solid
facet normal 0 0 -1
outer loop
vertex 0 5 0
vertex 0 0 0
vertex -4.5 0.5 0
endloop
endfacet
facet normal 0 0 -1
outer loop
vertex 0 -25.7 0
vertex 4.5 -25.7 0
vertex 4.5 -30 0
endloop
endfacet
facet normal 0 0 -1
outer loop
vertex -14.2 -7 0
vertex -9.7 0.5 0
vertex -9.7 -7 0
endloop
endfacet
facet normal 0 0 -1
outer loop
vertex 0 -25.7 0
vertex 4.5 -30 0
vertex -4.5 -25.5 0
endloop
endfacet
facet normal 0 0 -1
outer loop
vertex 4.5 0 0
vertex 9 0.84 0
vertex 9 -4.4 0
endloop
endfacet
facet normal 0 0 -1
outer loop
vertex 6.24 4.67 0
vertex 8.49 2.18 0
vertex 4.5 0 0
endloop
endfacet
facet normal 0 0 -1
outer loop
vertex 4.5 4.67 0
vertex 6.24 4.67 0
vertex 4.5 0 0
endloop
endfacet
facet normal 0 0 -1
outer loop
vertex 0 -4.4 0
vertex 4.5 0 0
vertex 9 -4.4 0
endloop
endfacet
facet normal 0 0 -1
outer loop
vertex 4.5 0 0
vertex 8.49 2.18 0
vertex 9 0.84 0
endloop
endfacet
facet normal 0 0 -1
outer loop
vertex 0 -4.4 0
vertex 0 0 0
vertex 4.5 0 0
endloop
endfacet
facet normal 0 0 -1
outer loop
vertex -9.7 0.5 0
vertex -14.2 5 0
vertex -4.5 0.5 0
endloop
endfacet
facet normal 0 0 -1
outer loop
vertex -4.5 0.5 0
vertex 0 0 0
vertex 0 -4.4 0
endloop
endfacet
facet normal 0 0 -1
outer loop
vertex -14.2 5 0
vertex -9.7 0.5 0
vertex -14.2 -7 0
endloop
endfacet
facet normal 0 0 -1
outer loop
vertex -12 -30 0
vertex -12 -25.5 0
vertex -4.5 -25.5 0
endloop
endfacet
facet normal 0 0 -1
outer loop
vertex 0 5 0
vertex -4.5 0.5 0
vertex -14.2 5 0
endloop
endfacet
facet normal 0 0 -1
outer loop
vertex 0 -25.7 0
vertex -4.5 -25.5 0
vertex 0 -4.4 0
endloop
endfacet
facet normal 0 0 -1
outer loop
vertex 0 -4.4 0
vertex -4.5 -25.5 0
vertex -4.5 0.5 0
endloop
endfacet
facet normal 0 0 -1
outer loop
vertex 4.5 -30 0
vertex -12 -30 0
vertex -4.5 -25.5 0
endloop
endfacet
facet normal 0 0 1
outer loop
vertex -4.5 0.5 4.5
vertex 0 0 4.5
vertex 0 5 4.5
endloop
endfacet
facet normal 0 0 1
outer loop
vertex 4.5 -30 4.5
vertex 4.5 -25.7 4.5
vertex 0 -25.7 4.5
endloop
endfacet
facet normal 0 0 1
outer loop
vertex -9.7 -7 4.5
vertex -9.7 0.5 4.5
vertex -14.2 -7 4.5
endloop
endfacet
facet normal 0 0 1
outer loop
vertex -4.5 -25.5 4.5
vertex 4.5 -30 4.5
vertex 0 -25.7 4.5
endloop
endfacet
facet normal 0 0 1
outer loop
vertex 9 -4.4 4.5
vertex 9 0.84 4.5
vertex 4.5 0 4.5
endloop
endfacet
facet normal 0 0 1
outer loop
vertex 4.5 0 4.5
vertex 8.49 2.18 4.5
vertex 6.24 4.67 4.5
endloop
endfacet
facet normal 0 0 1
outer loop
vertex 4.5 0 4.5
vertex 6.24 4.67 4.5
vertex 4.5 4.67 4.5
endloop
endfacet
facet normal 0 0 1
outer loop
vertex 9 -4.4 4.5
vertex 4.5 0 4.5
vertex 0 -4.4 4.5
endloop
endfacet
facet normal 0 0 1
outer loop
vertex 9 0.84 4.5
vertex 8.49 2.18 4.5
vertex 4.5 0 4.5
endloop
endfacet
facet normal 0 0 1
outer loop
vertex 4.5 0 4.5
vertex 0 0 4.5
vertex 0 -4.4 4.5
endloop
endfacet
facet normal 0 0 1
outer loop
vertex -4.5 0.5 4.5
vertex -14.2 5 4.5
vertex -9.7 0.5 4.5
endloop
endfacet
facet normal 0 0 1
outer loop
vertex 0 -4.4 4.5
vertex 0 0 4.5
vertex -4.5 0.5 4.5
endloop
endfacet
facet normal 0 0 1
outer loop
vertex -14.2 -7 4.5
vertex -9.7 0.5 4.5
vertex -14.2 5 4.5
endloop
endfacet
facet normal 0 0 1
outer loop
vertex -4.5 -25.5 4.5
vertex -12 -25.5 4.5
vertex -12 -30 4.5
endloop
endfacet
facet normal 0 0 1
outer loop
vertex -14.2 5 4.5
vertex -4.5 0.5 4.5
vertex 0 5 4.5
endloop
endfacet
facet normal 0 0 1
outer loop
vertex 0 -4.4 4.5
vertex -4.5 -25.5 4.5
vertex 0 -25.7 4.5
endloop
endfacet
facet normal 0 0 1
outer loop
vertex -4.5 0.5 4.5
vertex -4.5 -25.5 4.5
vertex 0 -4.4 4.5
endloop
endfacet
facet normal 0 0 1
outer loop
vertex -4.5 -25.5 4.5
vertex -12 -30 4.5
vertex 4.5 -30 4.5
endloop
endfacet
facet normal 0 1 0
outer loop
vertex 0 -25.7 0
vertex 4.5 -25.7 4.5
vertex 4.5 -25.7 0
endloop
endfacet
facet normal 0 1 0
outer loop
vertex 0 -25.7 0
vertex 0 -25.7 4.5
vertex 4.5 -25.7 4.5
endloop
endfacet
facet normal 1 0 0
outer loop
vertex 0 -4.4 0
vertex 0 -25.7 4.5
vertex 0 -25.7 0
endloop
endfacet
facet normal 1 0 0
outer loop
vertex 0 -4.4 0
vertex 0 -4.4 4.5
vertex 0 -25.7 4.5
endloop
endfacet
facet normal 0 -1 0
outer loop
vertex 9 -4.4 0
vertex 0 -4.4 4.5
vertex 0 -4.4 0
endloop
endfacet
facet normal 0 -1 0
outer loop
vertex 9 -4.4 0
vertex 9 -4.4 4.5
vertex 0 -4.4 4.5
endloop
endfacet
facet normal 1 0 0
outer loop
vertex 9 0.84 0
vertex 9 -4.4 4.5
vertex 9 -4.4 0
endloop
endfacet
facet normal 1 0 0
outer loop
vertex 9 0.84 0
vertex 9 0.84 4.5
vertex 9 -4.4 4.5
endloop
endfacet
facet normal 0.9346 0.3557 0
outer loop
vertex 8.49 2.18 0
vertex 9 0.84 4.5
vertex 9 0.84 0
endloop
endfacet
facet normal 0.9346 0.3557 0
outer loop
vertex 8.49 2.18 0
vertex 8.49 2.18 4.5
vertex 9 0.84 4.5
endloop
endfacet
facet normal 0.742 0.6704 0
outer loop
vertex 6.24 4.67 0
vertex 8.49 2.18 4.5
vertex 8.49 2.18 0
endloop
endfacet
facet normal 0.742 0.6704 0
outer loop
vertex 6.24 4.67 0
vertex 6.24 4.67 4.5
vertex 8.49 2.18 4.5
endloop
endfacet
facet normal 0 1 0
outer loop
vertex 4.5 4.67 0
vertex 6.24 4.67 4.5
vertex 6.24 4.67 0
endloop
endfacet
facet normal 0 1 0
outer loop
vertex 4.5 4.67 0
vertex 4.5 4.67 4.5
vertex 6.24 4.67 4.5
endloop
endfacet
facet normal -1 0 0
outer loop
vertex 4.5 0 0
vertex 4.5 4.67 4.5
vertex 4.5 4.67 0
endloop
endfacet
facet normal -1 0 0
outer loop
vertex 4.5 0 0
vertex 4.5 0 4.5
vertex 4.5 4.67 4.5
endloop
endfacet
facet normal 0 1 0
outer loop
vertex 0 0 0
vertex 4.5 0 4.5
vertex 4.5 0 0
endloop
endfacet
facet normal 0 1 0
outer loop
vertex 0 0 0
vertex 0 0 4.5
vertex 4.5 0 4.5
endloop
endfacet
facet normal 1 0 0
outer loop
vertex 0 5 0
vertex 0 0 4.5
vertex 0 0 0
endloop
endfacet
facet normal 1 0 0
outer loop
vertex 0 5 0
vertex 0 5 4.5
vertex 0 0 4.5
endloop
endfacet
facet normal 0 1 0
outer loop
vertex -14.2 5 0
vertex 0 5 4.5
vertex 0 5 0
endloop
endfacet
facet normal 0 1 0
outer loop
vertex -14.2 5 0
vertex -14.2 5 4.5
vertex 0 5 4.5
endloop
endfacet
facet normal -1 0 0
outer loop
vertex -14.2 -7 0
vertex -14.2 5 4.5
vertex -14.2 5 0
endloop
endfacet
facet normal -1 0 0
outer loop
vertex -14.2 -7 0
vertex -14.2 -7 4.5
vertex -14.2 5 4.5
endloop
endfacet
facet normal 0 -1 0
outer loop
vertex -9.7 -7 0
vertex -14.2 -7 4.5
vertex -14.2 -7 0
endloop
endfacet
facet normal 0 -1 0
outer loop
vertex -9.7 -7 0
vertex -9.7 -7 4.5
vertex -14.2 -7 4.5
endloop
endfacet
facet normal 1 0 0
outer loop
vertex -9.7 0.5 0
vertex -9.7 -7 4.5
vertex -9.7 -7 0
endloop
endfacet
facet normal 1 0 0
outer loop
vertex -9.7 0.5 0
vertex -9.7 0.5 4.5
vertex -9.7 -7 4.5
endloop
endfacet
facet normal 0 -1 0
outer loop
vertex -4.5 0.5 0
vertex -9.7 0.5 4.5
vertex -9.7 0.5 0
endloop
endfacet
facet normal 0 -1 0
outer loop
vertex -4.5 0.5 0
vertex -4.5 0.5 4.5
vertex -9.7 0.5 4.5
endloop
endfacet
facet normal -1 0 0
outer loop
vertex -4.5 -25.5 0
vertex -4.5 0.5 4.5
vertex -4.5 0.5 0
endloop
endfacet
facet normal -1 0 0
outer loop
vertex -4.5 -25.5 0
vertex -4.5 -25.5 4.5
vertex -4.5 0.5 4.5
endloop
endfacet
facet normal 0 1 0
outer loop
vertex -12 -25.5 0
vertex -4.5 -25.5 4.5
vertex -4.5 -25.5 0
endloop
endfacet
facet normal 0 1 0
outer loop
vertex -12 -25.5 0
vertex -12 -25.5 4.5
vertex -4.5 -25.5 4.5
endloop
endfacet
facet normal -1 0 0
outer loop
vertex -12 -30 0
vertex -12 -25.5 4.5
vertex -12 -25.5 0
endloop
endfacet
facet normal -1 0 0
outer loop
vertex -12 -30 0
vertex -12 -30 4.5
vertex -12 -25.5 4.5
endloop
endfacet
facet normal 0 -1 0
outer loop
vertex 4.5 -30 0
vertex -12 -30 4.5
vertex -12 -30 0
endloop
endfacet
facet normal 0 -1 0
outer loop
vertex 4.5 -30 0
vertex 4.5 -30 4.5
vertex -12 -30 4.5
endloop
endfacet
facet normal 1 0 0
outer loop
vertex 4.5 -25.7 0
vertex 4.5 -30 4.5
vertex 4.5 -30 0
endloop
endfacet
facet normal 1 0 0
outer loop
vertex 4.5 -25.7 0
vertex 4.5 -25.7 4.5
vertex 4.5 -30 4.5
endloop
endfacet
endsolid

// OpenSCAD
/*
 * Parametric SKADIS Universal Hook
 * Reconstructed from exact Cartesian coordinate data in "Hook - No Filets.step"
 */

/* [Global Properties] */
// Overall thickness/extrusion width of the hook
hook_thickness = 4.5; // [1.0:0.1:15.0]

/* [Board Interface (SKADIS)] */
// Thickness of the pegboard
board_thickness = 4.5; // [2.0:0.1:10.0]
// Vertical distance between the two pegs
peg_spacing = 21.3; // [15.0:0.1:30.0]
// Thickness of the top insertion peg
top_peg_thickness = 4.4; // [2.0:0.1:8.0]
// Height the top peg hooks upward behind the board
top_peg_hook_height = 4.67; // [1.0:0.01:10.0]
// Thickness of the bottom resting peg
bottom_peg_thickness = 4.3; // [2.0:0.1:8.0]

/* [Main Body (Spine)] */
// Thickness of the vertical spine resting against the board
spine_thickness = 4.5; // [2.0:0.1:10.0]

/* [Top Arm Geometry] */
// How far the top arm extends outward from the spine
top_arm_length = 9.7; // [1.0:0.1:50.0]
// Vertical thickness of the top arm
top_arm_thickness = 4.5; // [1.0:0.1:15.0]
// Distance the front lip drops downward
top_arm_drop = 7.5; // [0.0:0.1:30.0]
// Thickness of the front downward lip
top_arm_drop_thickness = 4.5; // [1.0:0.1:15.0]
// Vertical offset of the top arm from the peg origin
top_arm_y_offset = 0.5; // [-5.0:0.1:10.0]

/* [Bottom Arm Geometry] */
// How far the bottom arm extends outward from the spine
bottom_arm_length = 7.5; // [0.0:0.1:50.0]
// Vertical thickness of the bottom arm
bottom_arm_thickness = 4.5; // [1.0:0.1:15.0]

module skadis_hook() {
    // Calculate back protrusion based on board thickness to maintain chamfer slope
    board_adj = board_thickness - 4.5;
    peg_back_x = 9.0 + board_adj;
    
    linear_extrude(height = hook_thickness) {
        polygon(points=[
            // 1. Top Front of Top Arm
            [-(spine_thickness + top_arm_length), top_arm_y_offset + top_arm_thickness],
            // 2. Bottom Front of Top Arm Drop
            [-(spine_thickness + top_arm_length), top_arm_y_offset - top_arm_drop],
            // 3. Bottom Inner of Top Arm Drop
            [-(spine_thickness + top_arm_length - top_arm_drop_thickness), top_arm_y_offset - top_arm_drop],
            // 4. Inner Corner of Top Arm Drop
            [-(spine_thickness + top_arm_length - top_arm_drop_thickness), top_arm_y_offset],
            // 5. Inner Corner at Spine
            [-spine_thickness, top_arm_y_offset],
            // 6. Inner Corner at Bottom Arm
            [-spine_thickness, -(top_peg_thickness + peg_spacing + bottom_peg_thickness) + bottom_arm_thickness],
            // 7. Top Front of Bottom Arm
            [-(spine_thickness + bottom_arm_length), -(top_peg_thickness + peg_spacing + bottom_peg_thickness) + bottom_arm_thickness],
            // 8. Bottom Front of Bottom Arm
            [-(spine_thickness + bottom_arm_length), -(top_peg_thickness + peg_spacing + bottom_peg_thickness)],
            // 9. Bottom Back of Bottom Peg
            [board_thickness, -(top_peg_thickness + peg_spacing + bottom_peg_thickness)],
            // 10. Top Back of Bottom Peg
            [board_thickness, -(top_peg_thickness + peg_spacing)],
            // 11. Top Front of Bottom Peg (Spine Back)
            [0, -(top_peg_thickness + peg_spacing)],
            // 12. Bottom Front of Top Peg (Spine Back)
            [0, -top_peg_thickness],
            // 13. Bottom Back of Top Peg
            [peg_back_x, -top_peg_thickness],
            // 14. Top Back of straight peg section
            [peg_back_x, 0.84],
            // 15. Chamfer Point 1
            [8.49 + board_adj, 2.18],
            // 16. Chamfer Point 2
            [6.24 + board_adj, 4.67],
            // 17. Top of Top Peg Hook
            [board_thickness, top_peg_hook_height],
            // 18. Bottom of Top Peg Hook cutout
            [board_thickness, 0],
            // 19. Inner Top corner of Top Peg
            [0, 0],
            // 20. Top Back of Spine
            [0, top_arm_y_offset + top_arm_thickness]
        ]);
    }
}

skadis_hook();
